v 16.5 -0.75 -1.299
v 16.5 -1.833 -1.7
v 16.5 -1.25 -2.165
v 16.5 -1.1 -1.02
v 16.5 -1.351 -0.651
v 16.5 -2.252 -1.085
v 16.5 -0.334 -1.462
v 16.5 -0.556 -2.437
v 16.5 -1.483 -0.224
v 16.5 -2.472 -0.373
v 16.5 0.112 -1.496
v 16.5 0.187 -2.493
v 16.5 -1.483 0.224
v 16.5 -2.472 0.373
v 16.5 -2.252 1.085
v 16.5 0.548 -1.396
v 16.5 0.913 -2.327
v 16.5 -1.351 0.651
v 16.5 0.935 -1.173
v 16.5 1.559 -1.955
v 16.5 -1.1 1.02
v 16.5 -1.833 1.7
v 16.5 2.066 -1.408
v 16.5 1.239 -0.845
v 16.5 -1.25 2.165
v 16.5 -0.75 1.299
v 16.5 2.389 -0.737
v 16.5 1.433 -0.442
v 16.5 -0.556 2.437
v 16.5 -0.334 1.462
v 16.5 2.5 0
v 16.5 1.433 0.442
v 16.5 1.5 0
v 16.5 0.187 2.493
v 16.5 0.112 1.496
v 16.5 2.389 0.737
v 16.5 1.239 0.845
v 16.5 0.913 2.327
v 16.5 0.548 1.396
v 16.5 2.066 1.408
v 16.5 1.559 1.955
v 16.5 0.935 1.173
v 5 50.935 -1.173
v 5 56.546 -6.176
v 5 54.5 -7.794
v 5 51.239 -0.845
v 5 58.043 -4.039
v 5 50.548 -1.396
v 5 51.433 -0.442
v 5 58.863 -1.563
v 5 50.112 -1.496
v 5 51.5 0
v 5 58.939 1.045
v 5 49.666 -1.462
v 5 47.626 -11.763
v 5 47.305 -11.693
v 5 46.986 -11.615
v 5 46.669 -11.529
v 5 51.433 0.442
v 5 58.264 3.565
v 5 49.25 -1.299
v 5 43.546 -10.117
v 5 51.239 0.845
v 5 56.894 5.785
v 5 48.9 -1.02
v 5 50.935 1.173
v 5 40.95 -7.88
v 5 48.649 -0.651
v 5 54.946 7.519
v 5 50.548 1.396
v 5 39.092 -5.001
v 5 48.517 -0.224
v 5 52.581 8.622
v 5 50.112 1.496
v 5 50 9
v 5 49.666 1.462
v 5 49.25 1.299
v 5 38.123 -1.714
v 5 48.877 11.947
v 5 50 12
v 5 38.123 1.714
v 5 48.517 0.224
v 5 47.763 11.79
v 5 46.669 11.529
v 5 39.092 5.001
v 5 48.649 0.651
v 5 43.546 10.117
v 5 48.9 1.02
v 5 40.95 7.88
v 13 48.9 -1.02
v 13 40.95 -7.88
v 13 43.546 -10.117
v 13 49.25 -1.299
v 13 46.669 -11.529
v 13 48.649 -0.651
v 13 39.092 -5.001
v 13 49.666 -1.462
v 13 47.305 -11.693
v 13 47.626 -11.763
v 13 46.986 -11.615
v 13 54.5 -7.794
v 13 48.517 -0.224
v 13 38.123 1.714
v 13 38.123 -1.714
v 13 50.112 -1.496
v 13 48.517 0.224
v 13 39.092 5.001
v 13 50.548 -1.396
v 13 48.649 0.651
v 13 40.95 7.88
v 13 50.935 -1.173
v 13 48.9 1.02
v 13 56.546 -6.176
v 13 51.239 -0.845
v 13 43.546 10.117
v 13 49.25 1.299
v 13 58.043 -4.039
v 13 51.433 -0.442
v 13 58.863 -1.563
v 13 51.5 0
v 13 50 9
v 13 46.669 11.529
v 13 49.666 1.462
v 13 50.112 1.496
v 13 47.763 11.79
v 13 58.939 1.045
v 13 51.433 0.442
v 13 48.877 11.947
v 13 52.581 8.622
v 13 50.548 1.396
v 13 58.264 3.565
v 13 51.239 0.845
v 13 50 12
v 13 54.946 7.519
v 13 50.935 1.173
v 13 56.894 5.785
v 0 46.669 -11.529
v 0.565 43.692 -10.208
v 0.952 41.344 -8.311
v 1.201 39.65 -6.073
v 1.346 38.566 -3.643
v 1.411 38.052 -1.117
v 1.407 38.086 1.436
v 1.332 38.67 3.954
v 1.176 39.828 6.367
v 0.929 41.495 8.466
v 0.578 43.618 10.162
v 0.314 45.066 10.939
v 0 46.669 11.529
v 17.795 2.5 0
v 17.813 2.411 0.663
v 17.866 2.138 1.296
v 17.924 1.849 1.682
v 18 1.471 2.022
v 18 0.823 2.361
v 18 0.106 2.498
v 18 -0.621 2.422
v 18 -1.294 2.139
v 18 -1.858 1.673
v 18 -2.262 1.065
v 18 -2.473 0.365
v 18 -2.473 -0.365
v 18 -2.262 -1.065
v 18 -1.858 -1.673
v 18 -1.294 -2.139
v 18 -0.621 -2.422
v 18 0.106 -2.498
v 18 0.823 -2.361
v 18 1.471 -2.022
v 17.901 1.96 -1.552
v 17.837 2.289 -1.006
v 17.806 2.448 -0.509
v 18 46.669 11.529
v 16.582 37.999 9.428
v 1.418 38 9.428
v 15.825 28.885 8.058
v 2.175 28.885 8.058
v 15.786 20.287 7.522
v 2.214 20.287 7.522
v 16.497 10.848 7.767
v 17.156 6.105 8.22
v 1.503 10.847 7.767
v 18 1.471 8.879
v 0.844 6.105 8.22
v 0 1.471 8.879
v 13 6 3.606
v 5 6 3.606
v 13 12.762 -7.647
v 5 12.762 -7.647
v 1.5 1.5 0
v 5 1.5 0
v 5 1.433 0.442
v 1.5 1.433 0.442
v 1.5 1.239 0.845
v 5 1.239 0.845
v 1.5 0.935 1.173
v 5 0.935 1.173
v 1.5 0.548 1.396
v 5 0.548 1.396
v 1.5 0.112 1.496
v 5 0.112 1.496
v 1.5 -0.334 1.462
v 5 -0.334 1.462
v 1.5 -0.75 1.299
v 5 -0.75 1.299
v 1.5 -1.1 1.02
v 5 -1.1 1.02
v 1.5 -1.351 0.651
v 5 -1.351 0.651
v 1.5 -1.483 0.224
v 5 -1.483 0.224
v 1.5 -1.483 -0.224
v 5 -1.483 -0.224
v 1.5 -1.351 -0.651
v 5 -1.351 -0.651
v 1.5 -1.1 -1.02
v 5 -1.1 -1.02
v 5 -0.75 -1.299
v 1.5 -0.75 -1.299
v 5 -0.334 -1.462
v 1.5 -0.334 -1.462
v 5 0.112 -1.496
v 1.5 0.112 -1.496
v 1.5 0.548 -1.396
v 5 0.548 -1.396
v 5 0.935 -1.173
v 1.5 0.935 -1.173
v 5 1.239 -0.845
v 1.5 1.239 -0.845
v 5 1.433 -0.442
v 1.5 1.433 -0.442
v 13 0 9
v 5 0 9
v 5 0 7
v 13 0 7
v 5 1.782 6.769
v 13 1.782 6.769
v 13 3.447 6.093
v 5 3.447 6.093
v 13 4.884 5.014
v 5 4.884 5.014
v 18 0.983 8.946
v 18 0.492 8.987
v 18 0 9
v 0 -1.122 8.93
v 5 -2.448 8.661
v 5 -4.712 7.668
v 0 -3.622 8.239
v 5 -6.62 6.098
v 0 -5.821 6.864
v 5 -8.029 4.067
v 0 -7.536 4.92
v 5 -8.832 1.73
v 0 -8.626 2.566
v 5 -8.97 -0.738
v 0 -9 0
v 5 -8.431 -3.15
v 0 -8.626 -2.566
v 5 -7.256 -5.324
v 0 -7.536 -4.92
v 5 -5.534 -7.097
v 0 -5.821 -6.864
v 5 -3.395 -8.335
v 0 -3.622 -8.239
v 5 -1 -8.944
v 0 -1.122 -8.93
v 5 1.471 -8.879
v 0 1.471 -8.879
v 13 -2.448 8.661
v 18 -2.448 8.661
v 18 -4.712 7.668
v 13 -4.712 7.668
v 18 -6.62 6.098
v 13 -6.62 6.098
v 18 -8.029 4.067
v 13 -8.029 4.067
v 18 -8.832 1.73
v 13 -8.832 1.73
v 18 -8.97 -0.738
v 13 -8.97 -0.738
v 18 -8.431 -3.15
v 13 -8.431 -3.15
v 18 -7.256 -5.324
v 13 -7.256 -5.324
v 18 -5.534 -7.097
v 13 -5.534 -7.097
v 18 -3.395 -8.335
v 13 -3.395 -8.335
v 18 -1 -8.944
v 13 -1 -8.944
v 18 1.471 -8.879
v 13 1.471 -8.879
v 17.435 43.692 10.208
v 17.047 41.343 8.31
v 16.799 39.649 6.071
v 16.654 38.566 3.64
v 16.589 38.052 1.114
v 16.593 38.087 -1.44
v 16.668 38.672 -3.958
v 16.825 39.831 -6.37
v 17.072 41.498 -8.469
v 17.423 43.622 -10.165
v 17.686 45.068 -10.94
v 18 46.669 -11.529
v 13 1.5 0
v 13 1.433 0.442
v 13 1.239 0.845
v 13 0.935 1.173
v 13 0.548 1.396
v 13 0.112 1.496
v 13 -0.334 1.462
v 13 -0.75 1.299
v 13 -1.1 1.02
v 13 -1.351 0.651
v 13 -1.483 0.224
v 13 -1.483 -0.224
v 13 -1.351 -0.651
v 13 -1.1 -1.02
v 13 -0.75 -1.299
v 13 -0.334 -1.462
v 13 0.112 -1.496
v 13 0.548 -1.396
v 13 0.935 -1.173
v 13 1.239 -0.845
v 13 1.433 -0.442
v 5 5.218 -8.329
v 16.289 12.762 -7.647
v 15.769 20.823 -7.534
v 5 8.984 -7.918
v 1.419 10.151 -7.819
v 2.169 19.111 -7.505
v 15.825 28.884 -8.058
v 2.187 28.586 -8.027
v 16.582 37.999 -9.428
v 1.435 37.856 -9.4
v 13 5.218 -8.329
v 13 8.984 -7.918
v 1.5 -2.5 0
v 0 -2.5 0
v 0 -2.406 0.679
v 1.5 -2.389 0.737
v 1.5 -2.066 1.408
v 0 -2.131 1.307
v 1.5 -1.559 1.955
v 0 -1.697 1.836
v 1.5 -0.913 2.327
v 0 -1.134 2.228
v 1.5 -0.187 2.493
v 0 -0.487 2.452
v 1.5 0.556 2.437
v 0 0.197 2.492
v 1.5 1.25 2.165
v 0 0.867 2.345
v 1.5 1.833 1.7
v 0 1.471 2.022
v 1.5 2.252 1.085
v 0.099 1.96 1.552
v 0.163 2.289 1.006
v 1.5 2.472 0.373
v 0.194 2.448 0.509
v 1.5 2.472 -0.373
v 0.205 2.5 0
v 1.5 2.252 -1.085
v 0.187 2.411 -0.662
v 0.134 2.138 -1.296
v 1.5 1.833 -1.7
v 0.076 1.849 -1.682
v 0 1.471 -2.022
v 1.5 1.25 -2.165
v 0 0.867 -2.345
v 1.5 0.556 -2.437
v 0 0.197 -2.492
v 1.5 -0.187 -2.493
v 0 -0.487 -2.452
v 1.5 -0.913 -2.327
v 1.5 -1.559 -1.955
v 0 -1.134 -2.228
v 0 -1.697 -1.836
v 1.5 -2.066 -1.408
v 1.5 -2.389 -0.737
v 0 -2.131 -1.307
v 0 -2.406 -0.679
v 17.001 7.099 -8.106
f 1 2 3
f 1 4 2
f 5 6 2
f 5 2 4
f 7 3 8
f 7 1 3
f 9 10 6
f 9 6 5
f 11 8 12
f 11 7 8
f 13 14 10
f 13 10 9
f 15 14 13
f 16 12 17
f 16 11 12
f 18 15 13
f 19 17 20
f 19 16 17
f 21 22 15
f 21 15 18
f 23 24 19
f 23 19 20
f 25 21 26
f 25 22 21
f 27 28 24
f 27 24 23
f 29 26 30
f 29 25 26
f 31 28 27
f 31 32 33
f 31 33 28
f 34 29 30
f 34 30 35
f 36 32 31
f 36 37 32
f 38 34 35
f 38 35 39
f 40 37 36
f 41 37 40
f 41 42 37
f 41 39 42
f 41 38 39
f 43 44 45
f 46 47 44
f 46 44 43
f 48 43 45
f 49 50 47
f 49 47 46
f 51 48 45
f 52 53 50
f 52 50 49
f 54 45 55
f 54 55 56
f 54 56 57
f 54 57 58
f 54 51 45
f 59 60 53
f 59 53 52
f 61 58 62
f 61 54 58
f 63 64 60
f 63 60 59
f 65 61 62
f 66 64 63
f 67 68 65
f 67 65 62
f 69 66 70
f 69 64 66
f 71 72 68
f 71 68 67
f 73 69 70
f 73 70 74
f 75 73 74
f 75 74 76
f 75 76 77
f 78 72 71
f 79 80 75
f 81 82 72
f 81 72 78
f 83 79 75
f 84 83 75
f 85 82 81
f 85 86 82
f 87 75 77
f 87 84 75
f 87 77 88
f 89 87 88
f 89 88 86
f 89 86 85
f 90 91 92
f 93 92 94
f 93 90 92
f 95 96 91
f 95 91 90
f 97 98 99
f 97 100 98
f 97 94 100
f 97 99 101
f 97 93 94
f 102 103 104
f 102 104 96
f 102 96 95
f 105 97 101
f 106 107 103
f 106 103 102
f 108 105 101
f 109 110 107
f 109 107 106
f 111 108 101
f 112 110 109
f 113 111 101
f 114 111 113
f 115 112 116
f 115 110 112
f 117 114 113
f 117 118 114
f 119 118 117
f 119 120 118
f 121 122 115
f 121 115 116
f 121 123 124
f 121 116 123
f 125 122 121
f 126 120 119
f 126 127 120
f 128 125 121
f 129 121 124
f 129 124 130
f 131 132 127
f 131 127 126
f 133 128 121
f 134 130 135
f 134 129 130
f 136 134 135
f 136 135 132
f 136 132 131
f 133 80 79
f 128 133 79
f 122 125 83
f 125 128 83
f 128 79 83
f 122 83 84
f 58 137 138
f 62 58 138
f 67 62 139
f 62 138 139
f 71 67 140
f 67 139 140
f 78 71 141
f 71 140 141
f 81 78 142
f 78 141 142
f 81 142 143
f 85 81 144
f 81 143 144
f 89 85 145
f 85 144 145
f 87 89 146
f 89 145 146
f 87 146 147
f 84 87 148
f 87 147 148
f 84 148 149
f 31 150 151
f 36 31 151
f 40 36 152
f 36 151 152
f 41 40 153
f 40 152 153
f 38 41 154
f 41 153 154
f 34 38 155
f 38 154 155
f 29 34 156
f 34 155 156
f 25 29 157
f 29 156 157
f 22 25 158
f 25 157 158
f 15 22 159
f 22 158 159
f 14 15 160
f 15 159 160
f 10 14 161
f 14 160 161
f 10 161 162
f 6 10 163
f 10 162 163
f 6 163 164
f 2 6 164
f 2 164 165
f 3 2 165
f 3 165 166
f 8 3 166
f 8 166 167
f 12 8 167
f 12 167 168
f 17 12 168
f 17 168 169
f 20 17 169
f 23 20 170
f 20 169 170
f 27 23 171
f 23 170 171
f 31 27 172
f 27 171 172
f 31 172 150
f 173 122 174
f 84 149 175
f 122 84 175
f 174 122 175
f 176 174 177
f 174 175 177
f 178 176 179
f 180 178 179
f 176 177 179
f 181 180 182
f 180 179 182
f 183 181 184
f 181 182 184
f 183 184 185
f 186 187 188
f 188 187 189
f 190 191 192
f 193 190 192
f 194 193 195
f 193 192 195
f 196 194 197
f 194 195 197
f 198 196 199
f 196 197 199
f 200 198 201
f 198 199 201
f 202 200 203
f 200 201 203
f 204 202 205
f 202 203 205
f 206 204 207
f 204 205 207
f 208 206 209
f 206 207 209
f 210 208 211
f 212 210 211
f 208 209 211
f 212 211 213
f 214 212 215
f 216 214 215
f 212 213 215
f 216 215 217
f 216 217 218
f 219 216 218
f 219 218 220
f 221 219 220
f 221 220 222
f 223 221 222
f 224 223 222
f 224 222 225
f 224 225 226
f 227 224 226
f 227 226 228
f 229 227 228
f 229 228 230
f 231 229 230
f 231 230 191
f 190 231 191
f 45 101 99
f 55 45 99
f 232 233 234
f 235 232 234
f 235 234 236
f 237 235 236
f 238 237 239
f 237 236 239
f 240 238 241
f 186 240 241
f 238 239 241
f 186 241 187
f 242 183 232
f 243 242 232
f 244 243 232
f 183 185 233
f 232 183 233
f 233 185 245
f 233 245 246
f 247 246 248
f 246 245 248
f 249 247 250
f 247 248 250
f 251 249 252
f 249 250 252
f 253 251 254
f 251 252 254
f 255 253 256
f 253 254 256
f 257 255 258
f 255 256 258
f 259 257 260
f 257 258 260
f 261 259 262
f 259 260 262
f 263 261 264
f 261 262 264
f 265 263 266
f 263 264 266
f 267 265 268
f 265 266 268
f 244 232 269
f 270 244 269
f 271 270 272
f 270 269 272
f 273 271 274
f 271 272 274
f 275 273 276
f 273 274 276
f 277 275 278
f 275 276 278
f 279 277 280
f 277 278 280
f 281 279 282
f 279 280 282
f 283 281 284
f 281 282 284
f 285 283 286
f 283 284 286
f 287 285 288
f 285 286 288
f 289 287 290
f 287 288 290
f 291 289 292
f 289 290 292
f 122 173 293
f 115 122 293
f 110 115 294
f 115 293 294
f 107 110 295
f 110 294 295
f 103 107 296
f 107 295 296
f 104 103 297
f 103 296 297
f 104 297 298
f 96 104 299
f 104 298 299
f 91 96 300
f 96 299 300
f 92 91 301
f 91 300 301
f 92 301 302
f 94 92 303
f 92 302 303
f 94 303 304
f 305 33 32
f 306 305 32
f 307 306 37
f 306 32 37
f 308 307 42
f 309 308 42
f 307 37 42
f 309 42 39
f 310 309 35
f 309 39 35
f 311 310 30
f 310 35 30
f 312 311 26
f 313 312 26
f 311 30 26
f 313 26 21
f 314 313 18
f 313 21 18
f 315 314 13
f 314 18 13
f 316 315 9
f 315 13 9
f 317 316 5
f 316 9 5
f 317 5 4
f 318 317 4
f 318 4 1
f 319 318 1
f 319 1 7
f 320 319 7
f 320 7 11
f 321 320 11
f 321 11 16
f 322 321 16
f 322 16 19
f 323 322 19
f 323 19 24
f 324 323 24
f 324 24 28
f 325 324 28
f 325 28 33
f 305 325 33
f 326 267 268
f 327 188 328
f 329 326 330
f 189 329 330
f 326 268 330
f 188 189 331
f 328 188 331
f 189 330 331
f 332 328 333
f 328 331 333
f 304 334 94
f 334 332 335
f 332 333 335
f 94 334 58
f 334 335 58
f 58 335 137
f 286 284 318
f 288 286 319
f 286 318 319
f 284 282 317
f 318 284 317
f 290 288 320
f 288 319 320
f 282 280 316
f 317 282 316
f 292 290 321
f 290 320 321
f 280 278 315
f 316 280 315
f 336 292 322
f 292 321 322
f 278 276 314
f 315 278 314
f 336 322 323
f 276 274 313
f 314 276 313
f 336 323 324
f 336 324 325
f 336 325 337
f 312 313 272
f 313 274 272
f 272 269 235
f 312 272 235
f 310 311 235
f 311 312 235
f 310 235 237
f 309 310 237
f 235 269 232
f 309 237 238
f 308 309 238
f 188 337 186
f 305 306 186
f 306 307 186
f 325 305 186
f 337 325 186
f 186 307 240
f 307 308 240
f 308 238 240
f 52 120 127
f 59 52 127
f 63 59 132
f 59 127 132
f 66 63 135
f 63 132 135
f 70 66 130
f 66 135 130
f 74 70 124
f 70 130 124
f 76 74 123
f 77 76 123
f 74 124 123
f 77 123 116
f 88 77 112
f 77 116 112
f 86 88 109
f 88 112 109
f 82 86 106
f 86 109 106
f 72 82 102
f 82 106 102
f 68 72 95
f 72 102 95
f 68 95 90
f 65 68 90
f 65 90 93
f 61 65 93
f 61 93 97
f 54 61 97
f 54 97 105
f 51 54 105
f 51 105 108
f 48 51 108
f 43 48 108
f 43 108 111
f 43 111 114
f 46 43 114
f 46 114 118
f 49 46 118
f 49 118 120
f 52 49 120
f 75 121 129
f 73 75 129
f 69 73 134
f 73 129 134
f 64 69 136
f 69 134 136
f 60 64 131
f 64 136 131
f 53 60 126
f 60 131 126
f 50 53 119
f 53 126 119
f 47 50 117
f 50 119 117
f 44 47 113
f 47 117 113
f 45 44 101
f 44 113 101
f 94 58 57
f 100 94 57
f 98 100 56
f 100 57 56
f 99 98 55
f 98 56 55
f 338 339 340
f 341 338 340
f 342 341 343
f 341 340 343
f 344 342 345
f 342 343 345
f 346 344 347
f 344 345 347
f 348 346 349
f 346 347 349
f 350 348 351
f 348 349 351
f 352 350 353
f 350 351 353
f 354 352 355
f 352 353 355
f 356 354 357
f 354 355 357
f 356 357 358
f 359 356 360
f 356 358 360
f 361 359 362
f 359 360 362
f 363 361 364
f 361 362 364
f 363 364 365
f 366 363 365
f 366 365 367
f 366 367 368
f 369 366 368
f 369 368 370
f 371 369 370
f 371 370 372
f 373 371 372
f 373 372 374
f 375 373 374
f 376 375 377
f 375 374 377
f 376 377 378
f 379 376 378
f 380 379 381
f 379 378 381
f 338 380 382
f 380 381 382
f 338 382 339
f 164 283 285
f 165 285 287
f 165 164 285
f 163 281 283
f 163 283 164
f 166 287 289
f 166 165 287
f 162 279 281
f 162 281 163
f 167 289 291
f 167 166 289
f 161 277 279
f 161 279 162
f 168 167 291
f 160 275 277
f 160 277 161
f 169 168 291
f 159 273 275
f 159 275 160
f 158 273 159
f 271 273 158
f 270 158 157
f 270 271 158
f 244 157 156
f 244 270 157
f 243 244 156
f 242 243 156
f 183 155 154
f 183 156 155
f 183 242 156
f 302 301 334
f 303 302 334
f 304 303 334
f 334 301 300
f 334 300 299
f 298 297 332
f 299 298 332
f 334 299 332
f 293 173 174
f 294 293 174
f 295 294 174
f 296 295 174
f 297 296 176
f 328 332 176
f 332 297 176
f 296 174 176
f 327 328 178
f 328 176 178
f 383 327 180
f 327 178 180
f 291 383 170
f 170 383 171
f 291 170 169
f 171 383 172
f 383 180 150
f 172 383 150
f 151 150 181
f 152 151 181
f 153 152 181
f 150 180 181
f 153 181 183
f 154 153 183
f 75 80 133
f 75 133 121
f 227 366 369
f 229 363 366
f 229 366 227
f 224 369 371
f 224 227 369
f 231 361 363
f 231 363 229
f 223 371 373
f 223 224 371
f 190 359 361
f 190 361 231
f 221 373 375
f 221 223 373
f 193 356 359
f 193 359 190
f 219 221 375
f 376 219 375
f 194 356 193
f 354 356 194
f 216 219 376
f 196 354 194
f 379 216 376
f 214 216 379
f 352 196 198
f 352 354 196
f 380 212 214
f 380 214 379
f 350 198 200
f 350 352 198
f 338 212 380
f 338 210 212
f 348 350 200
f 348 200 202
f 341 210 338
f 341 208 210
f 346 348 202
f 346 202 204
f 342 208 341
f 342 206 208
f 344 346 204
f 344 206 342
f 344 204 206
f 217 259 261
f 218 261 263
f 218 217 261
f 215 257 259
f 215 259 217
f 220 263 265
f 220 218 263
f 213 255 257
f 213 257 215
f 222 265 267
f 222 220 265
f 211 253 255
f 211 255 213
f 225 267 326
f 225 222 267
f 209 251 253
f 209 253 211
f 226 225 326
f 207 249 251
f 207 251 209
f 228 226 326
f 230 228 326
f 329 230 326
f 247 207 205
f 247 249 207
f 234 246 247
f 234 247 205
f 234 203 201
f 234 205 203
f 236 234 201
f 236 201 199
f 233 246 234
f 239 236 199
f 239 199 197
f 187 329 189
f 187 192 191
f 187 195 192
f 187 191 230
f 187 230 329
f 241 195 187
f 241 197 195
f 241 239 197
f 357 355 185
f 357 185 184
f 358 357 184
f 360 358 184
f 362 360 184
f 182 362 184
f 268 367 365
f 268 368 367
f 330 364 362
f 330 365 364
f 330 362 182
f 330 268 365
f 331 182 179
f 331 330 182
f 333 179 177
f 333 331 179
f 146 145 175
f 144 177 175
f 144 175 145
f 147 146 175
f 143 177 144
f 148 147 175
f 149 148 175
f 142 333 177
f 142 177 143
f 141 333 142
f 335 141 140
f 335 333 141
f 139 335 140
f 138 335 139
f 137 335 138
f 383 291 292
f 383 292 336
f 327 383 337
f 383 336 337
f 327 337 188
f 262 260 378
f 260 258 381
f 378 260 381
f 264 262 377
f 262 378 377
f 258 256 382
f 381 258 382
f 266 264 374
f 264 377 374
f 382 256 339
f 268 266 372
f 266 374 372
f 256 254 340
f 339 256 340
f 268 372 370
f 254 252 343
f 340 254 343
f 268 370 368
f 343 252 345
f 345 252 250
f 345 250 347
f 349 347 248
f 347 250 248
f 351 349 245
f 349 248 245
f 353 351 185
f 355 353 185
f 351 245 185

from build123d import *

# Parameters (mm, degrees)
F1_DEPTH  = 5
F3_DEPTH  = 8
F5_DEPTH  = 5
F6_R      = 12
F7_DEPTH  = 5
F8_R      = 12
F9_DEPTH  = 5
F11_DEPTH = 13.001
F12_R     = 1.5
F13_DEPTH = 18.001
F14_R     = 2.5
F15_DEPTH = 1.5
F16_R     = 2.5
F17_DEPTH = 1.5
F18_R     = 113.2772211927
F19_DEPTH = 12.5


with BuildPart() as f1:
    # F0 (on Right) → F1 (new body)
    with BuildSketch(Plane.YZ):
        with BuildLine():
            ThreePointArc((46.6693164652, 11.5285101896), (24.2181276728, 7.6768989517), (1.4706951967, 8.8790233494))
            ThreePointArc((1.4706951967, 8.8790233494), (-9, 0), (1.4706951967, -8.8790233494))
            ThreePointArc((1.4706951967, -8.8790233494), (24.2181276728, -7.6768989517), (46.6693164652, -11.5285101896))
            ThreePointArc((46.6693164652, -11.5285101896), (62, 0), (46.6693164652, 11.5285101896))
        make_face()
    extrude(amount=F1_DEPTH)

    # F2 (on face) → F3 (join)
    with BuildSketch(Plane.YZ.offset(5)):
        with BuildLine():
            ThreePointArc((46.6693164652, 11.5285101896), (24.2181276728, 7.6768989517), (1.4706951967, 8.8790233494))
            ThreePointArc((1.4706951967, 8.8790233494), (0.7378312326, 8.9697048487), (0, 9))
            Line((0, 9), (0, 7))
            ThreePointArc((0, 7), (3.4468203516, 6.0925716626), (6, 3.6055512755))
            Line((6, 3.6055512755), (12.7617545607, -7.6466884694))
            ThreePointArc((12.7617545607, -7.6466884694), (29.8782372644, -8.1664058525), (46.6693164652, -11.5285101896))
            ThreePointArc((46.6693164652, -11.5285101896), (62, 0), (46.6693164652, 11.5285101896))
        make_face()
    extrude(amount=F3_DEPTH)

    # F4 (on face) → F5 (join)
    with BuildSketch(Plane.YZ.offset(13)):
        with BuildLine():
            ThreePointArc((1.4706951967, 8.8790233494), (0.7378312326, 8.9697048487), (0, 9))
            ThreePointArc((0, 9), (-8.9697048487, -0.7378312326), (1.4706951967, -8.8790233494))
            ThreePointArc((1.4706951967, -8.8790233494), (7.0991420432, -8.1063373261), (12.7617545607, -7.6466884694))
            ThreePointArc((12.7617545607, -7.6466884694), (29.8782372644, -8.1664058525), (46.6693164652, -11.5285101896))
            ThreePointArc((46.6693164652, -11.5285101896), (62, 0), (46.6693164652, 11.5285101896))
            ThreePointArc((46.6693164652, 11.5285101896), (24.2181276728, 7.6768989517), (1.4706951967, 8.8790233494))
        make_face()
    extrude(amount=F5_DEPTH)

    # F6 (on face) → F7 (cut)
    with BuildSketch(Plane.YZ.offset(18)):
        with Locations((50, 0)):
            Circle(F6_R)
    extrude(amount=-F7_DEPTH, mode=Mode.SUBTRACT)

    # F8 (on face) → F9 (cut)
    with BuildSketch(Plane(origin=(0, 0, 0), x_dir=(0, -1, 0), z_dir=(-1, 0, 0))):
        with Locations((-50, 0)):
            Circle(F8_R)
    extrude(amount=-F9_DEPTH, mode=Mode.SUBTRACT)

    # F10 (on face) → F11 (cut, through all)
    with BuildSketch(Plane.YZ.offset(13)):
        with BuildLine():
            Line((54.5, -7.7942286341), (47.6261364576, -11.7628556007))
            ThreePointArc((47.6261364576, -11.7628556007), (61.9405667204, -1.1928396355), (50, 12))
            Line((50, 12), (50, 9))
            ThreePointArc((50, 9), (58.6933324366, 2.3293714059), (54.5, -7.7942286341))
        make_face()
    extrude(amount=-F11_DEPTH, mode=Mode.SUBTRACT)

    # F12 (on face) → F13 (cut, through all)
    with BuildSketch(Plane.YZ.offset(18)):
        Circle(F12_R)
        with Locations((50, 0)):
            Circle(F12_R)
    extrude(amount=-F13_DEPTH, mode=Mode.SUBTRACT)

    # F14 (on face) → F15 (cut)
    with BuildSketch(Plane.YZ.offset(18)):
        Circle(F14_R)
    extrude(amount=-F15_DEPTH, mode=Mode.SUBTRACT)

    # F16 (on face) → F17 (cut)
    with BuildSketch(Plane(origin=(0, 0, 0), x_dir=(0, -1, 0), z_dir=(-1, 0, 0))):
        Circle(F16_R)
    extrude(amount=-F17_DEPTH, mode=Mode.SUBTRACT)

    # F18 (on Top) → F19 (cut, symmetric)
    with BuildSketch(Plane.XY):
        with Locations((-111, 24.070005831)):
            Circle(F18_R)
        with Locations((129, 24.070005831)):
            Circle(F18_R)
    extrude(amount=F19_DEPTH, both=True, mode=Mode.SUBTRACT)


solid = f1.part
